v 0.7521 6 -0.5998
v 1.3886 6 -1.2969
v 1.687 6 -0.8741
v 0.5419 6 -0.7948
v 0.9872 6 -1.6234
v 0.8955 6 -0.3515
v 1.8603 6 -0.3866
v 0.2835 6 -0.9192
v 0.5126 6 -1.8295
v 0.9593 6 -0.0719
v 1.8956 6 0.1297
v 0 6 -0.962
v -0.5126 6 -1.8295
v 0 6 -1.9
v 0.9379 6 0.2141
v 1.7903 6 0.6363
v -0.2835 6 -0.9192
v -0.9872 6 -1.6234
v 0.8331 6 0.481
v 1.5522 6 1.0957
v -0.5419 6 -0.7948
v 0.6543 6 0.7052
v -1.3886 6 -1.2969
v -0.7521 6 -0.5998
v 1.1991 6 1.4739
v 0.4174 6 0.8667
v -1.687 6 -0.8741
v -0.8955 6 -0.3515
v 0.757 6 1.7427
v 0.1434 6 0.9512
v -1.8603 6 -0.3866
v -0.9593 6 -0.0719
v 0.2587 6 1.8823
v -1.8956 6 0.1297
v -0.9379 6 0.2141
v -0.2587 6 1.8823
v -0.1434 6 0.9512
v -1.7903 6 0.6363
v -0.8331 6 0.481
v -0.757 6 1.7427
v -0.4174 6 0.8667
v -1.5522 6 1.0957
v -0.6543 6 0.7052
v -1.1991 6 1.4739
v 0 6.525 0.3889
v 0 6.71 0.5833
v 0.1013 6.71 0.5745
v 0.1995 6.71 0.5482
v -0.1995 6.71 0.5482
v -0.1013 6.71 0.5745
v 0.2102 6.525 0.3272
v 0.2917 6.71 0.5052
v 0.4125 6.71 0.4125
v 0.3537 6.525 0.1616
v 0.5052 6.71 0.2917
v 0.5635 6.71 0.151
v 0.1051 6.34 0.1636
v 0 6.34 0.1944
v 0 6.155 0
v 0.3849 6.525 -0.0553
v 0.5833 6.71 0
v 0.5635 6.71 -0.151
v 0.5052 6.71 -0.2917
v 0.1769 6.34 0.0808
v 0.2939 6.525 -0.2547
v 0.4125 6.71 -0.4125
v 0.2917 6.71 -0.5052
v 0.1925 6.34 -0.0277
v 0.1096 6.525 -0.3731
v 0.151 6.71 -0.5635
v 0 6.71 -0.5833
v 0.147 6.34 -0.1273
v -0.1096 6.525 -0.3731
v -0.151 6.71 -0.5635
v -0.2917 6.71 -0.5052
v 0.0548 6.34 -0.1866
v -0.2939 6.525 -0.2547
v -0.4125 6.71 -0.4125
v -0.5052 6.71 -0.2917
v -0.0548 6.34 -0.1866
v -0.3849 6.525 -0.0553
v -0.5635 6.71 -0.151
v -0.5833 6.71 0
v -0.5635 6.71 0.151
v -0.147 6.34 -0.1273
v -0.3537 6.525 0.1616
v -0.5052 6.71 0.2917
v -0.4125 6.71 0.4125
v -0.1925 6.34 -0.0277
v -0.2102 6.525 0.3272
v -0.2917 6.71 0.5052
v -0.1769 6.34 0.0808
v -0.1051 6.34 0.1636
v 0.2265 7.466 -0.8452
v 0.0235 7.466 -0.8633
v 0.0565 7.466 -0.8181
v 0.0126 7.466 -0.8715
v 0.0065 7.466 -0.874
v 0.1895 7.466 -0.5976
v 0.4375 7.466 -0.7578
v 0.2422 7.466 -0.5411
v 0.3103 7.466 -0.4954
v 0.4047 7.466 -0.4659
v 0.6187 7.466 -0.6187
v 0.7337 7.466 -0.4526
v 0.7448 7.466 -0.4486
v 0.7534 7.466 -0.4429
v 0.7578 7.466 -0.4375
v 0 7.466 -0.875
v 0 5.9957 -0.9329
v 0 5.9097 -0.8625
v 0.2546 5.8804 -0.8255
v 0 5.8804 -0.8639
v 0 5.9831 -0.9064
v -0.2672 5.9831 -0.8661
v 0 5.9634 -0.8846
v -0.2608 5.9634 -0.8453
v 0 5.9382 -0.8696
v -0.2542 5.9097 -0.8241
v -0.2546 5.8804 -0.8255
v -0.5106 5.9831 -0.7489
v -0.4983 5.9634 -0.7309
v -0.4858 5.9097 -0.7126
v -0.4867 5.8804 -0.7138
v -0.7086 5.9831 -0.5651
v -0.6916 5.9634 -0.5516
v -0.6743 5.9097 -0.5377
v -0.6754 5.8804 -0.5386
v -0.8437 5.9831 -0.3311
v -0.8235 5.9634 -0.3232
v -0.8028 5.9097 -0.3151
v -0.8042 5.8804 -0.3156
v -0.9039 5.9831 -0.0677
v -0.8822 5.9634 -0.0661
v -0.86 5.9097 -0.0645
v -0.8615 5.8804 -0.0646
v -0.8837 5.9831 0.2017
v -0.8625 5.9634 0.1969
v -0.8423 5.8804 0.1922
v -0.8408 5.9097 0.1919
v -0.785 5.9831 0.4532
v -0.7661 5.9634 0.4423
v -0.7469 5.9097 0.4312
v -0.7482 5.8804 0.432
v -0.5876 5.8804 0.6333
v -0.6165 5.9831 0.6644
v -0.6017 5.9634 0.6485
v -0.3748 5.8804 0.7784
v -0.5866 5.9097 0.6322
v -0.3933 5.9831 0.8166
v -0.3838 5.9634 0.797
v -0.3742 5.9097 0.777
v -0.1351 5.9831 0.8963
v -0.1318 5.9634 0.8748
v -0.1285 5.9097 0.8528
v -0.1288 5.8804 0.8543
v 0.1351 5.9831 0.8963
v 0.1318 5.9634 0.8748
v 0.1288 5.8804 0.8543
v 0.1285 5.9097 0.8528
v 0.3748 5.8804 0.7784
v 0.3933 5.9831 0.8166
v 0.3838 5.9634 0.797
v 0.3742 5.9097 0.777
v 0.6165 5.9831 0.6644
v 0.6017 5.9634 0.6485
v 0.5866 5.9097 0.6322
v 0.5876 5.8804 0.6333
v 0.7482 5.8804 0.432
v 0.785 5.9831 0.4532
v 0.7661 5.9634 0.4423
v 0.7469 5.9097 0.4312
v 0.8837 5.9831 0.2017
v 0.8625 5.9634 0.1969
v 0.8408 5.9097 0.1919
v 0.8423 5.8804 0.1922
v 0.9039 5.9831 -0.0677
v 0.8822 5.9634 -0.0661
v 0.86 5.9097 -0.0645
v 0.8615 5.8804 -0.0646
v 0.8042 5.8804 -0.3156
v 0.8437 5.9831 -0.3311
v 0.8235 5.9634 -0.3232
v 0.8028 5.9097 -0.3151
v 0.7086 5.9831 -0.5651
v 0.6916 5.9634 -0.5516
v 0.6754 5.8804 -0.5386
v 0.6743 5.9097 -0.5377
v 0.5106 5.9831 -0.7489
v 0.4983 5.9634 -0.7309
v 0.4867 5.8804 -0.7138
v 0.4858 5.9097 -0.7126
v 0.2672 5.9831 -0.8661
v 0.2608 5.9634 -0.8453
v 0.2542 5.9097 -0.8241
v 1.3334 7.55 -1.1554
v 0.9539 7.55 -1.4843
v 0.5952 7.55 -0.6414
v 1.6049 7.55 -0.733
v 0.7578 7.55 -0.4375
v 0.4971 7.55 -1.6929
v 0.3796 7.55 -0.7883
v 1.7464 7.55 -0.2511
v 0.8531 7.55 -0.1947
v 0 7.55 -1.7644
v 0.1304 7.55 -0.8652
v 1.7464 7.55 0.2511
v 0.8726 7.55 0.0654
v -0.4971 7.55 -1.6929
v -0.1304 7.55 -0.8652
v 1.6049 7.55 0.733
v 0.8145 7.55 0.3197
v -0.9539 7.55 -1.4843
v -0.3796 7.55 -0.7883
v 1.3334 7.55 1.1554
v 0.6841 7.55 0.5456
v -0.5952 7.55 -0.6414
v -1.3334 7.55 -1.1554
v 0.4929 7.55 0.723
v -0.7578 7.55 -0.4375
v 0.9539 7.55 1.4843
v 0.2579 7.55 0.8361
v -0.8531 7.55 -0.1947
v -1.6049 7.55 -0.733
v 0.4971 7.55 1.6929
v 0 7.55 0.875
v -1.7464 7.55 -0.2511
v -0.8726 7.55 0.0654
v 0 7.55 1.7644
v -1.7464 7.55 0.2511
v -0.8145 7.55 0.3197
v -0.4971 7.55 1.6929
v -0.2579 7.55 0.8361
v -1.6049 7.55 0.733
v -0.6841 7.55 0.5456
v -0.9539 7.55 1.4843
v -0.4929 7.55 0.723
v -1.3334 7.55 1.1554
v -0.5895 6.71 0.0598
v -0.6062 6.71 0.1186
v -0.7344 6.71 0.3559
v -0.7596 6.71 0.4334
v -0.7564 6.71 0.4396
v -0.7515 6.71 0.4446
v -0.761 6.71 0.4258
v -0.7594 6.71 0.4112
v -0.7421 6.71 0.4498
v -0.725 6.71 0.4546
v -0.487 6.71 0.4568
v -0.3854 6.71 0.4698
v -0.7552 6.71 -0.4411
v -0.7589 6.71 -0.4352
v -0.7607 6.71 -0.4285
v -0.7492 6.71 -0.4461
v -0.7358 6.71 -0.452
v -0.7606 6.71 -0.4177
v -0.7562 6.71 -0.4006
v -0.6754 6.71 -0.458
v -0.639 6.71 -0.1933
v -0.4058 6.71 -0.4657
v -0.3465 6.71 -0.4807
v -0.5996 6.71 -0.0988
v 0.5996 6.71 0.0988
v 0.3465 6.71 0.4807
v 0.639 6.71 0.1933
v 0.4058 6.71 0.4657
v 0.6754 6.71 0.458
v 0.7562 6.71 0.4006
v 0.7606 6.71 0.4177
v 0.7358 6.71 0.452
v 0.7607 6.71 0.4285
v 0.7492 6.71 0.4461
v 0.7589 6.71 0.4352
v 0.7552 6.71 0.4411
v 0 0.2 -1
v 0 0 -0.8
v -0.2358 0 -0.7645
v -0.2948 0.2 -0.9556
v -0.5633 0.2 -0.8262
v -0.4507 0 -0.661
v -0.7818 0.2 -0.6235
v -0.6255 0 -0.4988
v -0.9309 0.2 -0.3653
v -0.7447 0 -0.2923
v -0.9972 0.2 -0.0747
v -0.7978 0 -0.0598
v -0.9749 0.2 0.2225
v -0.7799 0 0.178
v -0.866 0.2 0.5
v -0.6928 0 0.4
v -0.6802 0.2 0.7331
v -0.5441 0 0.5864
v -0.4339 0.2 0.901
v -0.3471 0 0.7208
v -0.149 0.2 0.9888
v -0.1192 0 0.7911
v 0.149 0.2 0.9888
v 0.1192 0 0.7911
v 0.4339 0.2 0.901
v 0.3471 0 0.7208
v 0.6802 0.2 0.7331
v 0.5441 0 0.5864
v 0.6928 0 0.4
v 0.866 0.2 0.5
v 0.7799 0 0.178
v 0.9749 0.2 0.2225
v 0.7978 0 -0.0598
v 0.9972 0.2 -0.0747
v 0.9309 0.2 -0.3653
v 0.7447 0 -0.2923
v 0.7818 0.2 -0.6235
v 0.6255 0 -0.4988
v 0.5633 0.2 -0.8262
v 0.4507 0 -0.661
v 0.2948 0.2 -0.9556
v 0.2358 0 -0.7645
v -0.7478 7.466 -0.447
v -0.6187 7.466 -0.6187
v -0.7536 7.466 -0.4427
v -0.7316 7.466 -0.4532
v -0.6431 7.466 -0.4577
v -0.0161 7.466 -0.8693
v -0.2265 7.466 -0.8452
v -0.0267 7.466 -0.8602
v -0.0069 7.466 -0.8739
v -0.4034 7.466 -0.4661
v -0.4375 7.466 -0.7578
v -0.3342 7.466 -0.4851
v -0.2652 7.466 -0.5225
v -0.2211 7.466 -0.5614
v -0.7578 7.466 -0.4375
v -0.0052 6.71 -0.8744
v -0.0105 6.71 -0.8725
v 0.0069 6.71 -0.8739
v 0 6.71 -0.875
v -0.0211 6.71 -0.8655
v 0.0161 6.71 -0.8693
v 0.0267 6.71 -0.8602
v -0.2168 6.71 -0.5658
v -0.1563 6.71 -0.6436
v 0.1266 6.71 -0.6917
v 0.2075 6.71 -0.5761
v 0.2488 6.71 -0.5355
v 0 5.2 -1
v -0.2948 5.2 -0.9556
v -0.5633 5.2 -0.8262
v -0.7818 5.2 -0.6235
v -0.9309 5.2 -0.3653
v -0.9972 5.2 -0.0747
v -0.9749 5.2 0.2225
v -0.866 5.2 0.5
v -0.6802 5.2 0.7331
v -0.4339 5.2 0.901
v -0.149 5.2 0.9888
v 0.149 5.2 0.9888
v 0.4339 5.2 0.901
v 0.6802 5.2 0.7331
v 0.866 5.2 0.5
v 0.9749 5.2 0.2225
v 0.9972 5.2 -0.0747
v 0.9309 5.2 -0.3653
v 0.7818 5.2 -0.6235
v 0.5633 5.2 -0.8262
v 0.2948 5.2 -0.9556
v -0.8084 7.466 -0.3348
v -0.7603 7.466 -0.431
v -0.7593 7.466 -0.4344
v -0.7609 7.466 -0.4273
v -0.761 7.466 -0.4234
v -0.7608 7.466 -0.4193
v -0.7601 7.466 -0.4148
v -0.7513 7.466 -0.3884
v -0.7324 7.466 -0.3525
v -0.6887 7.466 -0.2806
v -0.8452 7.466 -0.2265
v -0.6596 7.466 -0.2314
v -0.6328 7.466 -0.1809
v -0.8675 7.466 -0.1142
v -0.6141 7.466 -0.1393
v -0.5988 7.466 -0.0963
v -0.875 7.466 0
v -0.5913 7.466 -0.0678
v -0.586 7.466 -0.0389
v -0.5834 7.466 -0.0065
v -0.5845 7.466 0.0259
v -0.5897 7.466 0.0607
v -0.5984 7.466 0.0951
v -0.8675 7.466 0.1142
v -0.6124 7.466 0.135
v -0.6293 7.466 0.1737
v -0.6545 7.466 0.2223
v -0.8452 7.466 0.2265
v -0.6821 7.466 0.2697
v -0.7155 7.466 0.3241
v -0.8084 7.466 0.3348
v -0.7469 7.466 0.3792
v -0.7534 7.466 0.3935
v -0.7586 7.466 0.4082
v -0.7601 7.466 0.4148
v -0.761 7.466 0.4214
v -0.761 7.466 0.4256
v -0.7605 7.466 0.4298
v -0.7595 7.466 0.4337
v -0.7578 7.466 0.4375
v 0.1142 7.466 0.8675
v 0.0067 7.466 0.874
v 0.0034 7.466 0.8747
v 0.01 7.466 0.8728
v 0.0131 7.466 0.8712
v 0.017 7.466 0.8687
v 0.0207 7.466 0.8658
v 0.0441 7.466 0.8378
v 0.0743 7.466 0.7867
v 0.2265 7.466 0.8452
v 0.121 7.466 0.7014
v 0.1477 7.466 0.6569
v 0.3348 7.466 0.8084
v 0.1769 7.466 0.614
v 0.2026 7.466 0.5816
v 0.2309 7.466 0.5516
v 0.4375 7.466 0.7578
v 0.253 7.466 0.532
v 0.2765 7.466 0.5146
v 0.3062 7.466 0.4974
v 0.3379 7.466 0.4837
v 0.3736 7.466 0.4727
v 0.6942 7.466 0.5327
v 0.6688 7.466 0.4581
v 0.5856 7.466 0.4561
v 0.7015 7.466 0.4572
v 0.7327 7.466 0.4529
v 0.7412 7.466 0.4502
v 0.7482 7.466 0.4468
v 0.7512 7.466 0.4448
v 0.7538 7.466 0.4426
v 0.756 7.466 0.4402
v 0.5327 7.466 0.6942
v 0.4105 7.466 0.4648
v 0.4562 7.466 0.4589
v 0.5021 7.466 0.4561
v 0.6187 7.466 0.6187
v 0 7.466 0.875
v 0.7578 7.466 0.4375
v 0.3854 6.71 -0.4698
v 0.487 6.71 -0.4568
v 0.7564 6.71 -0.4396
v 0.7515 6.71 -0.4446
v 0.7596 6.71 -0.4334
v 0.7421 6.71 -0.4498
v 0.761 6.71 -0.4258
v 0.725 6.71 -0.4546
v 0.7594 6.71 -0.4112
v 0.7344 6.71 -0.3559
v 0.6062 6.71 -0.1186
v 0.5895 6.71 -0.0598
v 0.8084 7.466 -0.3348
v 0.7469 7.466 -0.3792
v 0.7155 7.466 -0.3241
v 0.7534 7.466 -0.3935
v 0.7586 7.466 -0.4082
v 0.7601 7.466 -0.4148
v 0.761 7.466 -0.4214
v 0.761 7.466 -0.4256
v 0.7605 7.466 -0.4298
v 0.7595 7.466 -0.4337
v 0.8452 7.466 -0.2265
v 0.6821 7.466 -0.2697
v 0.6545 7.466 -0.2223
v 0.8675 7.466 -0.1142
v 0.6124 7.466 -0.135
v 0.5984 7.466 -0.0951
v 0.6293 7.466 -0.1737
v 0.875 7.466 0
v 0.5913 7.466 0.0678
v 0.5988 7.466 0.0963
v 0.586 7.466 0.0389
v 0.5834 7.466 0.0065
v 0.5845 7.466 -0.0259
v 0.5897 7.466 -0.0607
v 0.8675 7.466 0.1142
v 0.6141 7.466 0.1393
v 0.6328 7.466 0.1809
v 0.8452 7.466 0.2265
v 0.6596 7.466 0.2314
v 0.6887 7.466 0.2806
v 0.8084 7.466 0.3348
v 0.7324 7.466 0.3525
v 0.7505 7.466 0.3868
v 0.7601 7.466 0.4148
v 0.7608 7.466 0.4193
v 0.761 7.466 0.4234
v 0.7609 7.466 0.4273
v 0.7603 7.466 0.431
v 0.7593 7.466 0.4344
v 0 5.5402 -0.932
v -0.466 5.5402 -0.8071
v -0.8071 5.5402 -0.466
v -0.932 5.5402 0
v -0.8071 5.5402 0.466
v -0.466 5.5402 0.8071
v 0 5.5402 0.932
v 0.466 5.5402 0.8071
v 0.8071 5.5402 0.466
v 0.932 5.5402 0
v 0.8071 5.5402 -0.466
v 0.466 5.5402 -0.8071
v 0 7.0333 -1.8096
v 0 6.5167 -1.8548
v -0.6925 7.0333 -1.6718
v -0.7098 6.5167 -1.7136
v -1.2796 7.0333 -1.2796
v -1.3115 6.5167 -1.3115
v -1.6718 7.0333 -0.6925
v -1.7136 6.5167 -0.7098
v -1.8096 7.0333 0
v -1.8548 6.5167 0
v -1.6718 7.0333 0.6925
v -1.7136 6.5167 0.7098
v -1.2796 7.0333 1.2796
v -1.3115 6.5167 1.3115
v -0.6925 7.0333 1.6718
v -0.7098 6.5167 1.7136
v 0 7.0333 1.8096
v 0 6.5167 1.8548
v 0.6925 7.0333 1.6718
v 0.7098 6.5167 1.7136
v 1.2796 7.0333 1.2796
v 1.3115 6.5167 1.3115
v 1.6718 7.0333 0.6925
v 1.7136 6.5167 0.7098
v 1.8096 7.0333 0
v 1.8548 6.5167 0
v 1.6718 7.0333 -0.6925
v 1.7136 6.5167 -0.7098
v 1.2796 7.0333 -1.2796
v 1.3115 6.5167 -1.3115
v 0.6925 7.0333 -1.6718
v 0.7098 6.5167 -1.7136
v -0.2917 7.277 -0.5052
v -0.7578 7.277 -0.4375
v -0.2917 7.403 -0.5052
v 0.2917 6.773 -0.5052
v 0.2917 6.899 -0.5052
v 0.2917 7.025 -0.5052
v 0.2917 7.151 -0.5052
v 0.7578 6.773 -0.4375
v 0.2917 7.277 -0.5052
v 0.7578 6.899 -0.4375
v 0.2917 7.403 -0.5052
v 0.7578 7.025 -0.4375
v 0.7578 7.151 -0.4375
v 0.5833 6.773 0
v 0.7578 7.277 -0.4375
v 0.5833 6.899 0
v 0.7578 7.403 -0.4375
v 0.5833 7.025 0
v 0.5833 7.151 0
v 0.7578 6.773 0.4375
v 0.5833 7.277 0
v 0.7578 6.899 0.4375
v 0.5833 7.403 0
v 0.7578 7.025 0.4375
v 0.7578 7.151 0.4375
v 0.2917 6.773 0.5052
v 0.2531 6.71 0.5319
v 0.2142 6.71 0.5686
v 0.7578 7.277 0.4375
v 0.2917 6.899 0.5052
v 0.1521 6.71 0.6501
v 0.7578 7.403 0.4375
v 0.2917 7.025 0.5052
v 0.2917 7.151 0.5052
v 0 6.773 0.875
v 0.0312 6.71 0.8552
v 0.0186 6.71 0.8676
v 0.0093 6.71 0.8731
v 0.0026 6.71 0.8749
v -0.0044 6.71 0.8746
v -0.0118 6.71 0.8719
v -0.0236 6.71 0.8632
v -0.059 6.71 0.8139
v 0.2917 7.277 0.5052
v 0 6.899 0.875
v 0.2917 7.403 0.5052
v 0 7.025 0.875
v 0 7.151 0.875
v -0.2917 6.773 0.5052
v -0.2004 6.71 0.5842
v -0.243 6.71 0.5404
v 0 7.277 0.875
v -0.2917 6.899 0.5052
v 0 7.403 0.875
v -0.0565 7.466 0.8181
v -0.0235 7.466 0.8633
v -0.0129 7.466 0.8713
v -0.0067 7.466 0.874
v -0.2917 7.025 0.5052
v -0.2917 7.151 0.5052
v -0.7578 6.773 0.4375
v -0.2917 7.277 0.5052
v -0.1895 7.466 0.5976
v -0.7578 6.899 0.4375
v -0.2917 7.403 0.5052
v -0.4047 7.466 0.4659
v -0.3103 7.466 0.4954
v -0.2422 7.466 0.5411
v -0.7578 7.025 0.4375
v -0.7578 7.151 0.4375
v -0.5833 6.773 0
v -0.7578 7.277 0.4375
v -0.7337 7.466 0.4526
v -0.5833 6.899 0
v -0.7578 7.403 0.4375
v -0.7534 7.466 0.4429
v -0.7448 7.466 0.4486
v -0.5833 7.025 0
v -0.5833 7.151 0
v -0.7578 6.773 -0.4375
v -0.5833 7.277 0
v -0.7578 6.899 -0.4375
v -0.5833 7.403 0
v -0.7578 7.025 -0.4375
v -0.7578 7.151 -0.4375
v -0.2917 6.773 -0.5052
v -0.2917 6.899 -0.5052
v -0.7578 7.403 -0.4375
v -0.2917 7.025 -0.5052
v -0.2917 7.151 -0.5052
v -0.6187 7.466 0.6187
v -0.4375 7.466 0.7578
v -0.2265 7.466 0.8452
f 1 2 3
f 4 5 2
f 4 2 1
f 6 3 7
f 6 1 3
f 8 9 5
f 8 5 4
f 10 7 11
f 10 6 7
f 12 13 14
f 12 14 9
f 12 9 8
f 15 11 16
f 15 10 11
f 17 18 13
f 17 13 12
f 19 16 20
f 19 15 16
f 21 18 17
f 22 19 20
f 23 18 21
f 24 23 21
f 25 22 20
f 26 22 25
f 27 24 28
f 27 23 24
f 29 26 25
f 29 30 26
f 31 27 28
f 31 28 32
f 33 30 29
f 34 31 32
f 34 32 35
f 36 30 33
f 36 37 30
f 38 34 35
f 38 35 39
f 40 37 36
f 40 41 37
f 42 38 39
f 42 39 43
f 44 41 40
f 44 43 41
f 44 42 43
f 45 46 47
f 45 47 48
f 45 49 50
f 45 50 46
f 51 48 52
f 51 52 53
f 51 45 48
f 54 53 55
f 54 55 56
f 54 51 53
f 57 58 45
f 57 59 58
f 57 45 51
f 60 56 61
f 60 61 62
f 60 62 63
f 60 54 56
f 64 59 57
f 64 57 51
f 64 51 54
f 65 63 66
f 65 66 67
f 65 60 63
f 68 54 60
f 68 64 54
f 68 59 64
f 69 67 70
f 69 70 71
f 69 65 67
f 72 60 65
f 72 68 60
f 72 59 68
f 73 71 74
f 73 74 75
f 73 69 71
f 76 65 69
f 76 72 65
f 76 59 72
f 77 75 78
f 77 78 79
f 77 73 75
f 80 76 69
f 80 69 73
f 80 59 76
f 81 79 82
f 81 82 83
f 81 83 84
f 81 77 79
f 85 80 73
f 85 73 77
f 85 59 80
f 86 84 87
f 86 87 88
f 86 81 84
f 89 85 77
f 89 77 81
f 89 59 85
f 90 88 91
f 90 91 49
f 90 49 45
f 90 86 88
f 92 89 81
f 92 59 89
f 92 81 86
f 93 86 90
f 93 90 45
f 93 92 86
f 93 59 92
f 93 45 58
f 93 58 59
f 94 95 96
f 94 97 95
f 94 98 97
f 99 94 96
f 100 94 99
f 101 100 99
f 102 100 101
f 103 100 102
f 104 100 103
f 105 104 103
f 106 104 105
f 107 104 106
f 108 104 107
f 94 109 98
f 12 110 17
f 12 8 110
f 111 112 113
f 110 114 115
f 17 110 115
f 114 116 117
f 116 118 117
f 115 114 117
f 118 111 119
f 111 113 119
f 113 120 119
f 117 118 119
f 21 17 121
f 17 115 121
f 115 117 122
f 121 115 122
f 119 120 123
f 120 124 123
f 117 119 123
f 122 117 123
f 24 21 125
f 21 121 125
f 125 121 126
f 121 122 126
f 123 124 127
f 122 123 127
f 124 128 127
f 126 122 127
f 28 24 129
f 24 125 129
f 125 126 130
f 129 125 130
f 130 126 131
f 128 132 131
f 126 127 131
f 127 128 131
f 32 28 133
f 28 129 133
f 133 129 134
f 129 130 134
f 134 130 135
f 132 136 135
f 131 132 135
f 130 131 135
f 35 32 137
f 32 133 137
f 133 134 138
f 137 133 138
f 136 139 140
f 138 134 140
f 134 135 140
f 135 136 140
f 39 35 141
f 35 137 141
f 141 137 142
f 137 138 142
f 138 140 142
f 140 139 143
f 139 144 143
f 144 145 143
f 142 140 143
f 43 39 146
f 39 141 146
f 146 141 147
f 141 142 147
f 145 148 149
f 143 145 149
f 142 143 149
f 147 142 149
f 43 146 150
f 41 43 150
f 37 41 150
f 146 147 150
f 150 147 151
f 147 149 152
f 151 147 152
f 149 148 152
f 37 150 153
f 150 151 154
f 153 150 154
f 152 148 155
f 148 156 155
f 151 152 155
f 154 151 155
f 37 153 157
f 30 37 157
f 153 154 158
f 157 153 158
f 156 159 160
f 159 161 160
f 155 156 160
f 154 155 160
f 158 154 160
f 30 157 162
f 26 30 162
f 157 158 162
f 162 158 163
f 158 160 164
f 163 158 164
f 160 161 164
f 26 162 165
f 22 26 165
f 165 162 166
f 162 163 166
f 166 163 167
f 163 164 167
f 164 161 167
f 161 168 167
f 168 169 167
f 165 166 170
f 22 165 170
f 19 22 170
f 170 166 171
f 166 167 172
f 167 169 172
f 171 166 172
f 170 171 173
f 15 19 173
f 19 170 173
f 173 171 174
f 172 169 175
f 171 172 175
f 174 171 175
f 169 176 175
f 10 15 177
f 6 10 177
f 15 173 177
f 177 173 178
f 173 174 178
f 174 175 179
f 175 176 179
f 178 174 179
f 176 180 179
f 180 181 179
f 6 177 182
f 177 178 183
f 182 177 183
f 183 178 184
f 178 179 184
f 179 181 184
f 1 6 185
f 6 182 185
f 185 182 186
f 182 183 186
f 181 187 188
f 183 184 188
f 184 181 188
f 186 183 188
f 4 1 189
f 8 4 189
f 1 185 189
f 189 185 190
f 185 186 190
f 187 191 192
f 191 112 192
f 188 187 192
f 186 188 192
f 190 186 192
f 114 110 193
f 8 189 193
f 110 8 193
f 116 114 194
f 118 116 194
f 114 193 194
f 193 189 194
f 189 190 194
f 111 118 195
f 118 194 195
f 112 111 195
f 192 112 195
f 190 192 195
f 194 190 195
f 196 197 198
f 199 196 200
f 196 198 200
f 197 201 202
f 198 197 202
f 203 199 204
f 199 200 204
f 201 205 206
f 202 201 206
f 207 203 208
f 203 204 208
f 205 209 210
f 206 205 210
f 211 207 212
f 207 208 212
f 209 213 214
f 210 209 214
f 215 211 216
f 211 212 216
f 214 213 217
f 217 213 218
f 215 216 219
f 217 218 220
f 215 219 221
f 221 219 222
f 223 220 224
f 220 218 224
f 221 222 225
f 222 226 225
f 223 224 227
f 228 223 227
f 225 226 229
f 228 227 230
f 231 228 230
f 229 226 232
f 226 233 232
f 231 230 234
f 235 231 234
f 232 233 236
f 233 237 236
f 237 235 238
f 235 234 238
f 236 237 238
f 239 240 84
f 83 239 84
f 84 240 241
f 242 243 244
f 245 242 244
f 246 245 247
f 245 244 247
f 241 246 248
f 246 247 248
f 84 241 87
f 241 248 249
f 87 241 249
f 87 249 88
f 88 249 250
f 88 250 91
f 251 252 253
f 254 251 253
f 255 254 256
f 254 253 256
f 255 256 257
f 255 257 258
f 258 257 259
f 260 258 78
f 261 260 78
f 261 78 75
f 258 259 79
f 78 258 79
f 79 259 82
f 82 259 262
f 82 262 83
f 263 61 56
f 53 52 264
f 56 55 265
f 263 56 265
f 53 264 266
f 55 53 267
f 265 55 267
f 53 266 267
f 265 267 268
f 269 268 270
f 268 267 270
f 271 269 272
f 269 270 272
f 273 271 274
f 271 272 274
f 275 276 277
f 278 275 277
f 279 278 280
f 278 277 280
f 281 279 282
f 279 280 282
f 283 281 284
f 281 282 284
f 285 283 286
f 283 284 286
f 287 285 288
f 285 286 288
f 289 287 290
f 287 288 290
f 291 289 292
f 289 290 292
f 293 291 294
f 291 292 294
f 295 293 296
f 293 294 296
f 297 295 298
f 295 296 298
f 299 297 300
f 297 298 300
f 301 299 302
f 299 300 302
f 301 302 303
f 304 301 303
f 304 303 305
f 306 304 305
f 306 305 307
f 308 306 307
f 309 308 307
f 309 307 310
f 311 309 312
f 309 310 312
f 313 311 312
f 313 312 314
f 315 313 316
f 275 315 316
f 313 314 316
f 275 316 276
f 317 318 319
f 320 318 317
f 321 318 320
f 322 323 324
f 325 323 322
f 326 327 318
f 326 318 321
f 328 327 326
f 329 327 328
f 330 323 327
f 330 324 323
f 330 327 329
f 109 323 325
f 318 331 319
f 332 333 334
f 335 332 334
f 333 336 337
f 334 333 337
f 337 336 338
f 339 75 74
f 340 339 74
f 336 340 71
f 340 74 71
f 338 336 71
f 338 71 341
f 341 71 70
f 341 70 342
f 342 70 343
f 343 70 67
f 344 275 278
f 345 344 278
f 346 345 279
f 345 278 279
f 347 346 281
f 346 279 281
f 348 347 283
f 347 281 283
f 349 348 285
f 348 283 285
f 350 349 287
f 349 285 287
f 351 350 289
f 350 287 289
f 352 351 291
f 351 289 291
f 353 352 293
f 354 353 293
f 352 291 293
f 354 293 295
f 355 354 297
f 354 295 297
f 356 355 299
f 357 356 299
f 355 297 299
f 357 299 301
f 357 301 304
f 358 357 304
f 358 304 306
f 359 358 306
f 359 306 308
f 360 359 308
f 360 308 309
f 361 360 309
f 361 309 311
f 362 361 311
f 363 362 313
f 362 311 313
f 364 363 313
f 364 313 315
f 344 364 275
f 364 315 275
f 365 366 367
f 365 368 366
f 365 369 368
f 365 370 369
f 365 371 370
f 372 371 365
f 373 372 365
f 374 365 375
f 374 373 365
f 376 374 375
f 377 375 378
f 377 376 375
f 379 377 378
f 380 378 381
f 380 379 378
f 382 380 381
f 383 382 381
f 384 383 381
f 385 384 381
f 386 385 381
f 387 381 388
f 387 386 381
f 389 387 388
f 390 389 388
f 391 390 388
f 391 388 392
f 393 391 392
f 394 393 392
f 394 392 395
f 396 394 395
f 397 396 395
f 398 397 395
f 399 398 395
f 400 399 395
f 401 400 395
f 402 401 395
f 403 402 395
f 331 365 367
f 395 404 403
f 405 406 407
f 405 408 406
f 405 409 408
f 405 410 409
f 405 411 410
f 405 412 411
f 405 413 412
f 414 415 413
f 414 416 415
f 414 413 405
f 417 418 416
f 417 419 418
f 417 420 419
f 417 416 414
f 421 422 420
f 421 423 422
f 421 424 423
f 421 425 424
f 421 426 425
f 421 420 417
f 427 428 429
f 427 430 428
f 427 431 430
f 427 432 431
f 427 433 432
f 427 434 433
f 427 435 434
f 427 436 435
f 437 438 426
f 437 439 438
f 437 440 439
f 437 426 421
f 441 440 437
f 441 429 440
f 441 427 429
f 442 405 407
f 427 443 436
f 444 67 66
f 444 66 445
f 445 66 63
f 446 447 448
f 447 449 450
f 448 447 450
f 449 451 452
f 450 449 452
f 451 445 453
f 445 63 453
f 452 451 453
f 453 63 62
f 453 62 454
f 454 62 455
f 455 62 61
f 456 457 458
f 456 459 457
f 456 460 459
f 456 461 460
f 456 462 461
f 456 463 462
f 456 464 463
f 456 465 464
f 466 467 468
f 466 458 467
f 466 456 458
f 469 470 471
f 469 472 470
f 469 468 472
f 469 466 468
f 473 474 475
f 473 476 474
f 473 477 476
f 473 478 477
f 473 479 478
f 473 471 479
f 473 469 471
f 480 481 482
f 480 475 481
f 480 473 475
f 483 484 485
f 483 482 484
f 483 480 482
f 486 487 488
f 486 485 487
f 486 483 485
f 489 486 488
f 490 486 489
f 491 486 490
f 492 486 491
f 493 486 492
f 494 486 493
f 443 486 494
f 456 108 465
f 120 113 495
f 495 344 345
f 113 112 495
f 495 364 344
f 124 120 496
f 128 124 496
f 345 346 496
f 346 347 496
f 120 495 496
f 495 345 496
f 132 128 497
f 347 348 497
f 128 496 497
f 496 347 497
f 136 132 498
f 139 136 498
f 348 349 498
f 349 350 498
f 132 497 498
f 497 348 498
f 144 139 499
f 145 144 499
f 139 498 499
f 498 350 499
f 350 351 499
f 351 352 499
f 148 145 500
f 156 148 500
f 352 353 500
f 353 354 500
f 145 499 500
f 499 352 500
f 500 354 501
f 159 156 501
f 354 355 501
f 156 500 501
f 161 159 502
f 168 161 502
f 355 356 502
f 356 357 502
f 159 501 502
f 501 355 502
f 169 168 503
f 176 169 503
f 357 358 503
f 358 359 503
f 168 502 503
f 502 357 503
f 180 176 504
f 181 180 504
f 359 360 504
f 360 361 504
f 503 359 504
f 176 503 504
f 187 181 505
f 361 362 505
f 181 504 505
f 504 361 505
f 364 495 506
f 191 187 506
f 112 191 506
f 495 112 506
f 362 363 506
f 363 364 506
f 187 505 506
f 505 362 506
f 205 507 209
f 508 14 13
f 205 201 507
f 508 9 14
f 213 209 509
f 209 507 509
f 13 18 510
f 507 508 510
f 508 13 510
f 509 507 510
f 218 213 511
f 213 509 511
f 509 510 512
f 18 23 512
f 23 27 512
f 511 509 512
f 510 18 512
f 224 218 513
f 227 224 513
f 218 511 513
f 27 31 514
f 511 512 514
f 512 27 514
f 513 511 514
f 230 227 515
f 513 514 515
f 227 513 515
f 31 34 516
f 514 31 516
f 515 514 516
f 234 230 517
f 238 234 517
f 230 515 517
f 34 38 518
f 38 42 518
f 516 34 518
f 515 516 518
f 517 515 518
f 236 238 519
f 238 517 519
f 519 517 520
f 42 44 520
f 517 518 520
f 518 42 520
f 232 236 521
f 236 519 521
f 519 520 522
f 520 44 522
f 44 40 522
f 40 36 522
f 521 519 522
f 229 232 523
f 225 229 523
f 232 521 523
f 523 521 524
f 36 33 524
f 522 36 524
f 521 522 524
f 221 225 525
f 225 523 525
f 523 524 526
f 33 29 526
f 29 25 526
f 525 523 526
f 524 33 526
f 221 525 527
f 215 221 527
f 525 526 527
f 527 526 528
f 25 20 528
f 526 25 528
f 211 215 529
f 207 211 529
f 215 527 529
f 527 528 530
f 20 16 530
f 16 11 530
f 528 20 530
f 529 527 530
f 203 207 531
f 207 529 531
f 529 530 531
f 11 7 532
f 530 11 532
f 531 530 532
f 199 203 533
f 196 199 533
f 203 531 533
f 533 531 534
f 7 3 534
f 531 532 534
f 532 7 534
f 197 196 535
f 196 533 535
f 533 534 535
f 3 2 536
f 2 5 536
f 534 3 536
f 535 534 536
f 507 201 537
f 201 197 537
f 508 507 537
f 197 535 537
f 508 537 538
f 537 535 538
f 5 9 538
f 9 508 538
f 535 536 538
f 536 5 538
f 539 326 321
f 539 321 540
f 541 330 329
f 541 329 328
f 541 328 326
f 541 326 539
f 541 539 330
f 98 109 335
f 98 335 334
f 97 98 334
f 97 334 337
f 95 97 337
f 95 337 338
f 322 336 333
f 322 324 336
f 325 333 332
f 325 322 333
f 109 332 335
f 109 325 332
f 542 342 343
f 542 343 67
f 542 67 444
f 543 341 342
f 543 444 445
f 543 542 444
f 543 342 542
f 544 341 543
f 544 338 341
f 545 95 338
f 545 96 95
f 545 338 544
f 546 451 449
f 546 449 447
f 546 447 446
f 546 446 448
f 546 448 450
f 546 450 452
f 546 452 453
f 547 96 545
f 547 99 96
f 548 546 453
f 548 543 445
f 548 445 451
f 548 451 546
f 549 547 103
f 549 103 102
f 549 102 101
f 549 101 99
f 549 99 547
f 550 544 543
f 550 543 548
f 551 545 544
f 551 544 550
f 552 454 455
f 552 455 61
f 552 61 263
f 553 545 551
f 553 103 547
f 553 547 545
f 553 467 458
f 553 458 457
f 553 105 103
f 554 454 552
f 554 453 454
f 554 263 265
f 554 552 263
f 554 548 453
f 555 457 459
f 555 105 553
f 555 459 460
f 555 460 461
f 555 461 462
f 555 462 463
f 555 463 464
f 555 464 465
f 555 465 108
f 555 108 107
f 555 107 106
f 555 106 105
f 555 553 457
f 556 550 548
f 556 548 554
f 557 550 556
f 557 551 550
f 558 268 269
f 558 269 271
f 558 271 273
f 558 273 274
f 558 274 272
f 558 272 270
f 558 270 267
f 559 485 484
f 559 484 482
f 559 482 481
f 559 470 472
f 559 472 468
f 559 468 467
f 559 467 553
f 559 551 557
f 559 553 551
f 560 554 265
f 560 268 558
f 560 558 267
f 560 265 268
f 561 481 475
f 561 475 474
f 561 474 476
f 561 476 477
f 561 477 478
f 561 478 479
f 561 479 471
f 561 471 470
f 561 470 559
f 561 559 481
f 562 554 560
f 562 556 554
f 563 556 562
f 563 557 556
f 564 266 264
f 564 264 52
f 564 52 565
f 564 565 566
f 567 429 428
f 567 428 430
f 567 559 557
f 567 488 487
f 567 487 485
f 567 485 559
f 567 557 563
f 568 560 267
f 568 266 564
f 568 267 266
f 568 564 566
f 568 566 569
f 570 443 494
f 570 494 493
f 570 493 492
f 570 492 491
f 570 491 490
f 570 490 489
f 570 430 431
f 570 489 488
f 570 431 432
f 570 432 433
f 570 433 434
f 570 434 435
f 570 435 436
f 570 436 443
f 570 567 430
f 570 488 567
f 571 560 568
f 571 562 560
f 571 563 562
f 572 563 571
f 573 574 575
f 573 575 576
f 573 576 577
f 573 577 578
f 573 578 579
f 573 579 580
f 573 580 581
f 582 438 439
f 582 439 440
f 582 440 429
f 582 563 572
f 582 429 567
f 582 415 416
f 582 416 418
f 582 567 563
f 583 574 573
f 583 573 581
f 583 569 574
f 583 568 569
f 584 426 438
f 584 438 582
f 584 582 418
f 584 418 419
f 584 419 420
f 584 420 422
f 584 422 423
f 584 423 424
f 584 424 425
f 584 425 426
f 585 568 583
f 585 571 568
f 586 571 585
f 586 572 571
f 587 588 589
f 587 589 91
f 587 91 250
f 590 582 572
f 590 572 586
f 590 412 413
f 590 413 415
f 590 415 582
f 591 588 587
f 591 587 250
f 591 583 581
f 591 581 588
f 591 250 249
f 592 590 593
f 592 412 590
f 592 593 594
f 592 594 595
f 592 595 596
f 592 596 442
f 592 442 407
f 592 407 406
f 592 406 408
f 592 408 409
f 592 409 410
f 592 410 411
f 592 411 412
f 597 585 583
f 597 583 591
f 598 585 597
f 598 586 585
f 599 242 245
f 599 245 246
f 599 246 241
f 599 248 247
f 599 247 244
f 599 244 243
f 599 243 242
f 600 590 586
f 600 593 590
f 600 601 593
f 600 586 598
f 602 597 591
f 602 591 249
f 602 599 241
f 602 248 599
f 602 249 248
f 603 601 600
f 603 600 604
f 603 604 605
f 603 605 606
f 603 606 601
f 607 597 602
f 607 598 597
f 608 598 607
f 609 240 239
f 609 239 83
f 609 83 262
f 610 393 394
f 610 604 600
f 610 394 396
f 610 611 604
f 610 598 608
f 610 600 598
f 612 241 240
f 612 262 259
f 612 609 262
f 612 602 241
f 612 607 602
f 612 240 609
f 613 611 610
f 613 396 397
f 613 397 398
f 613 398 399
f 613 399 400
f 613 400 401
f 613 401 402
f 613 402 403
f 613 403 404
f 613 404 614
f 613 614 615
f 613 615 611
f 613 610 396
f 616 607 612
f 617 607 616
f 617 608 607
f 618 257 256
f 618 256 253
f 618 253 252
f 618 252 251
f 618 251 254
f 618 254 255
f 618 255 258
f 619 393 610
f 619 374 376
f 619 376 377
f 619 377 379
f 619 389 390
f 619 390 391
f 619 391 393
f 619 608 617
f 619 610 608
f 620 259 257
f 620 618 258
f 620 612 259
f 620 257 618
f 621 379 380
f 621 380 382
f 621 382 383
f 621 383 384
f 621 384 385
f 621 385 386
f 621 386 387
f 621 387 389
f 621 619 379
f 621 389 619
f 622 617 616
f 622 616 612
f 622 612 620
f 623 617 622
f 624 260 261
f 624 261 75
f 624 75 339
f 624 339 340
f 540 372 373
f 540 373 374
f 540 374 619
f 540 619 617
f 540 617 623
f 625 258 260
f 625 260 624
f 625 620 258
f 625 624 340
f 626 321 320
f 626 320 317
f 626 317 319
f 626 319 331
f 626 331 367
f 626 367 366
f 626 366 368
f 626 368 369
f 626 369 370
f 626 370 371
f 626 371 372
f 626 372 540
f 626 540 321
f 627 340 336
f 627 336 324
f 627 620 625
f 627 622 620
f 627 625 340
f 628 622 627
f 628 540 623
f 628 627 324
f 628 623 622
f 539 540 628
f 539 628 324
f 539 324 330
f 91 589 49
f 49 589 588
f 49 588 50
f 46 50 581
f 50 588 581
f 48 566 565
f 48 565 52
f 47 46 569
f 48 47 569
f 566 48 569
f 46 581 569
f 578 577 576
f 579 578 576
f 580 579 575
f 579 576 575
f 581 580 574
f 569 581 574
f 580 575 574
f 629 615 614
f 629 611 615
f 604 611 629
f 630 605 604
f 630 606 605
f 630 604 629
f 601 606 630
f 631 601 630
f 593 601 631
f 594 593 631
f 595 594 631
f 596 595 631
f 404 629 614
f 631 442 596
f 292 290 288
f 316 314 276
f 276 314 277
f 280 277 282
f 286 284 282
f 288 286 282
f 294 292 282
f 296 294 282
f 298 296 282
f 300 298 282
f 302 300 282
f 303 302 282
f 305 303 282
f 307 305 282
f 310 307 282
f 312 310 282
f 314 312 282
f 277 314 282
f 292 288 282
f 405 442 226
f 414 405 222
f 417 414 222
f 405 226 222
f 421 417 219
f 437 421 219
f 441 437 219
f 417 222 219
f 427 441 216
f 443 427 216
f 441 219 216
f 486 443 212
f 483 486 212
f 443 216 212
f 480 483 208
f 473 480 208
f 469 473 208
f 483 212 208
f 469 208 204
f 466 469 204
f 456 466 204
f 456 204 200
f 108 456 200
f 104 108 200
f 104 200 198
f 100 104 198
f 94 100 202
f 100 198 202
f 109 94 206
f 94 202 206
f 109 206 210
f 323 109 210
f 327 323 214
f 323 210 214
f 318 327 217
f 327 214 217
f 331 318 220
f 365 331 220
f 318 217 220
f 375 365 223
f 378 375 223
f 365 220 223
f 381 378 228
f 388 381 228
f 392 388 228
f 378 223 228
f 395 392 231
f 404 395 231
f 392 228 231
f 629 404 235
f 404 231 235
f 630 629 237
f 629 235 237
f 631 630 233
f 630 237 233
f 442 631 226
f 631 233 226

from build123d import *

# Parameters (mm, degrees)
FILLET1_R                 = 0.1
SOCKET_CUT_EXTRUDE1_DEPTH = 0.84
SKETCH3_R                 = 0.875
SOCKET_CUT_EXTRUDE2_DEPTH = 0.084
CHAFL_N1_SIZE             = 0.2


with BuildPart() as part:
    # Sketch1 → Body-Revolve (revolve)
    with BuildSketch(Plane.XY, mode=Mode.PRIVATE) as body_revolve_sk:
        Polygon((0, 7.55), (1.764392572, 7.55), (1.9, 6), (1, 6), (0.84, 6), (1, 5.2), (1, 0), (0, 0), align=None)
    revolve(body_revolve_sk.sketch.rotate(Axis((0, 0, 0), (0, 1, 0)), 90), axis=Axis((0, 0, 0), (0, 1, 0)))

    # Fillet1
    fillet1_edges = [part.edges().sort_by_distance(p)[0] for p in [
        (0, 6, 0.84),
    ]]
    fillet(fillet1_edges, radius=FILLET1_R)

    # Sketch2 → Socket-Cut-Extrude1 (cut)
    with BuildSketch(Plane(origin=(0, 7.55, 0), x_dir=(-1, 0, 0), z_dir=(0, 1, 0))):
        with BuildLine():
            add(Edge.make_bspline(
                [(0, -0.875), (-0.062906837, -0.875), (-0.18872051, -0.326873512), (-0.99511796, -0.574531622), (-0.37744102, 0), (-0.99511796, 0.574531622), (-0.18872051, 0.326873512), (0, 1.149063244), (0.18872051, 0.326873512), (0.99511796, 0.574531622), (0.37744102, 0), (0.99511796, -0.574531622), (0.18872051, -0.326873512), (0.062906837, -0.875), (0, -0.875)],
                knots=[0, 0, 0, 0, 0.083333333, 0.166666667, 0.25, 0.333333333, 0.416666667, 0.5, 0.583333333, 0.666666667, 0.75, 0.833333333, 0.916666667, 1, 1, 1, 1], degree=3))
        make_face()
    extrude(amount=-SOCKET_CUT_EXTRUDE1_DEPTH, mode=Mode.SUBTRACT)

    # Sketch3 → Socket-Cut-Extrude2 (cut)
    with BuildSketch(Plane(origin=(0, 7.55, 0), x_dir=(-1, 0, 0), z_dir=(0, 1, 0))):
        with Locations(Location((0, 0, 0), (0, 0, 90))):
            Circle(SKETCH3_R)
    extrude(amount=-SOCKET_CUT_EXTRUDE2_DEPTH, mode=Mode.SUBTRACT)

    # Sketch4 → Drill-Cut-Revolve (revolve, cut)
    with BuildSketch(Plane.XY, mode=Mode.PRIVATE) as drill_cut_revolve_sk:
        Polygon((0, 6.71), (0.583333333, 6.71), (0, 6.155), align=None)
    revolve(drill_cut_revolve_sk.sketch.rotate(Axis((0, 0, 0), (0, 1, 0)), 270), axis=Axis((0, 0, 0), (0, 1, 0)), mode=Mode.SUBTRACT)

    # Chaflán1
    chafl_n1_edges = [part.edges().sort_by_distance(p)[0] for p in [
        (0, 0, 1),
    ]]
    chamfer(chafl_n1_edges, length=CHAFL_N1_SIZE)


solid = part.part
